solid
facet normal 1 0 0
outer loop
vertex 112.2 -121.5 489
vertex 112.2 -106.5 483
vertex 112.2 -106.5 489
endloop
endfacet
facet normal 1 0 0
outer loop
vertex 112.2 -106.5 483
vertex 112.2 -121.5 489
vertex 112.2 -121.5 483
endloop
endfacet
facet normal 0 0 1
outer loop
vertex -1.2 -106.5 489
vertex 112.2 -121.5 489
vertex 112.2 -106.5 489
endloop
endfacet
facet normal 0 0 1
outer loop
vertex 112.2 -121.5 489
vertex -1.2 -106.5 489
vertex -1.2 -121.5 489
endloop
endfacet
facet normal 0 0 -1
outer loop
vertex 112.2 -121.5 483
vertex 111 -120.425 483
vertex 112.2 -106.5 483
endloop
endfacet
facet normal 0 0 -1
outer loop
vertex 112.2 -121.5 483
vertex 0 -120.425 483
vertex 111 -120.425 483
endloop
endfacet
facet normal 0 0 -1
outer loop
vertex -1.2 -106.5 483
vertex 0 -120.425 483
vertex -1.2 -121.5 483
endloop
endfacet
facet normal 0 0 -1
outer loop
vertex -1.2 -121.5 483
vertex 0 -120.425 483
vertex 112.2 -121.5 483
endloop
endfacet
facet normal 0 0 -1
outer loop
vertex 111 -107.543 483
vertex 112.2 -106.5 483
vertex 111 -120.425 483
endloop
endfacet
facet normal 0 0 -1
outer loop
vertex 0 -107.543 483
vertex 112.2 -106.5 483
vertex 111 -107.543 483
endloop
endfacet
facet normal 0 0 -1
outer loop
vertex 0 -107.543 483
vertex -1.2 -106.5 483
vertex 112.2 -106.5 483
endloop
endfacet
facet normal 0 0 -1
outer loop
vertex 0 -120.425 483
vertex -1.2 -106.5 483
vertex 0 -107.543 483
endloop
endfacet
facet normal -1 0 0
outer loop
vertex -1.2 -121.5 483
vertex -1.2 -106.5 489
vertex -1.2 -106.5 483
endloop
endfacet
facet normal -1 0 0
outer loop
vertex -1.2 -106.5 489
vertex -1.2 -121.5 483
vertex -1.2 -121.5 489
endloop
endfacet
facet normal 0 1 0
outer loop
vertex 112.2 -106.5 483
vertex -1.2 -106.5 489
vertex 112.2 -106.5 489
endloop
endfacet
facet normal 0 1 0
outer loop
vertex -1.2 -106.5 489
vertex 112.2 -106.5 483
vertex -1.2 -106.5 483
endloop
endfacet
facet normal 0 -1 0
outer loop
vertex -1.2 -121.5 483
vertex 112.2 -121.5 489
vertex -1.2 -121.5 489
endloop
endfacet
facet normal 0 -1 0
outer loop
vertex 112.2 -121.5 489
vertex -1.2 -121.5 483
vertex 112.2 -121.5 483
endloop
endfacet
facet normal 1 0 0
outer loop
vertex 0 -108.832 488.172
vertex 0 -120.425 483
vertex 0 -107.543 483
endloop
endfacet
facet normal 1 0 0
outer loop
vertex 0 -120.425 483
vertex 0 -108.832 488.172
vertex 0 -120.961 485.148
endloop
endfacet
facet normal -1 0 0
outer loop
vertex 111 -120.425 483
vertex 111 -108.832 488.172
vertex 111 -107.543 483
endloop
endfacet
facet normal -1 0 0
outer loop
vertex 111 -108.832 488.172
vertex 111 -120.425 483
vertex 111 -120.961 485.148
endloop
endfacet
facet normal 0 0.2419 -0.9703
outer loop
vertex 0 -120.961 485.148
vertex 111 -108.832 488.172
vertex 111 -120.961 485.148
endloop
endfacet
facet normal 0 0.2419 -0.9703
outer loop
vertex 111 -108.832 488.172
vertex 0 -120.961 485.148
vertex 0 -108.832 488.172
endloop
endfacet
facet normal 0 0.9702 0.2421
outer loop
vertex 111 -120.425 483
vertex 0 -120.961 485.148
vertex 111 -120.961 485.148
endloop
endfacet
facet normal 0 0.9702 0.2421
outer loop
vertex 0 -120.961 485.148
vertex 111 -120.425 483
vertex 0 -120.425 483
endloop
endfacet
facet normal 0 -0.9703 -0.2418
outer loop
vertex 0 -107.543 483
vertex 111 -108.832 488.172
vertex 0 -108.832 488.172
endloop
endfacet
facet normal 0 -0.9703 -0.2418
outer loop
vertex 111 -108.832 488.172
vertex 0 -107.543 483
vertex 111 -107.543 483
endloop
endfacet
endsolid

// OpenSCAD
// leiter-halterung

// 76, 176 grad
module latten(){
    rotate([90-76,0,0])
    cube([2*55+1, 12.5, 500]);
}

wall = 1.2;

module oben(){
    difference(){
        translate([-wall,-121.5,483])
        cube([2*55+1+2*wall, 15,6]);
        
        latten();
    }
}

module unten(){
    difference(){
        translate([-wall,-2,0])
        cube([2*55+1+2*wall, 15, 5]);

        latten();
    }
}

//unten();
oben();
